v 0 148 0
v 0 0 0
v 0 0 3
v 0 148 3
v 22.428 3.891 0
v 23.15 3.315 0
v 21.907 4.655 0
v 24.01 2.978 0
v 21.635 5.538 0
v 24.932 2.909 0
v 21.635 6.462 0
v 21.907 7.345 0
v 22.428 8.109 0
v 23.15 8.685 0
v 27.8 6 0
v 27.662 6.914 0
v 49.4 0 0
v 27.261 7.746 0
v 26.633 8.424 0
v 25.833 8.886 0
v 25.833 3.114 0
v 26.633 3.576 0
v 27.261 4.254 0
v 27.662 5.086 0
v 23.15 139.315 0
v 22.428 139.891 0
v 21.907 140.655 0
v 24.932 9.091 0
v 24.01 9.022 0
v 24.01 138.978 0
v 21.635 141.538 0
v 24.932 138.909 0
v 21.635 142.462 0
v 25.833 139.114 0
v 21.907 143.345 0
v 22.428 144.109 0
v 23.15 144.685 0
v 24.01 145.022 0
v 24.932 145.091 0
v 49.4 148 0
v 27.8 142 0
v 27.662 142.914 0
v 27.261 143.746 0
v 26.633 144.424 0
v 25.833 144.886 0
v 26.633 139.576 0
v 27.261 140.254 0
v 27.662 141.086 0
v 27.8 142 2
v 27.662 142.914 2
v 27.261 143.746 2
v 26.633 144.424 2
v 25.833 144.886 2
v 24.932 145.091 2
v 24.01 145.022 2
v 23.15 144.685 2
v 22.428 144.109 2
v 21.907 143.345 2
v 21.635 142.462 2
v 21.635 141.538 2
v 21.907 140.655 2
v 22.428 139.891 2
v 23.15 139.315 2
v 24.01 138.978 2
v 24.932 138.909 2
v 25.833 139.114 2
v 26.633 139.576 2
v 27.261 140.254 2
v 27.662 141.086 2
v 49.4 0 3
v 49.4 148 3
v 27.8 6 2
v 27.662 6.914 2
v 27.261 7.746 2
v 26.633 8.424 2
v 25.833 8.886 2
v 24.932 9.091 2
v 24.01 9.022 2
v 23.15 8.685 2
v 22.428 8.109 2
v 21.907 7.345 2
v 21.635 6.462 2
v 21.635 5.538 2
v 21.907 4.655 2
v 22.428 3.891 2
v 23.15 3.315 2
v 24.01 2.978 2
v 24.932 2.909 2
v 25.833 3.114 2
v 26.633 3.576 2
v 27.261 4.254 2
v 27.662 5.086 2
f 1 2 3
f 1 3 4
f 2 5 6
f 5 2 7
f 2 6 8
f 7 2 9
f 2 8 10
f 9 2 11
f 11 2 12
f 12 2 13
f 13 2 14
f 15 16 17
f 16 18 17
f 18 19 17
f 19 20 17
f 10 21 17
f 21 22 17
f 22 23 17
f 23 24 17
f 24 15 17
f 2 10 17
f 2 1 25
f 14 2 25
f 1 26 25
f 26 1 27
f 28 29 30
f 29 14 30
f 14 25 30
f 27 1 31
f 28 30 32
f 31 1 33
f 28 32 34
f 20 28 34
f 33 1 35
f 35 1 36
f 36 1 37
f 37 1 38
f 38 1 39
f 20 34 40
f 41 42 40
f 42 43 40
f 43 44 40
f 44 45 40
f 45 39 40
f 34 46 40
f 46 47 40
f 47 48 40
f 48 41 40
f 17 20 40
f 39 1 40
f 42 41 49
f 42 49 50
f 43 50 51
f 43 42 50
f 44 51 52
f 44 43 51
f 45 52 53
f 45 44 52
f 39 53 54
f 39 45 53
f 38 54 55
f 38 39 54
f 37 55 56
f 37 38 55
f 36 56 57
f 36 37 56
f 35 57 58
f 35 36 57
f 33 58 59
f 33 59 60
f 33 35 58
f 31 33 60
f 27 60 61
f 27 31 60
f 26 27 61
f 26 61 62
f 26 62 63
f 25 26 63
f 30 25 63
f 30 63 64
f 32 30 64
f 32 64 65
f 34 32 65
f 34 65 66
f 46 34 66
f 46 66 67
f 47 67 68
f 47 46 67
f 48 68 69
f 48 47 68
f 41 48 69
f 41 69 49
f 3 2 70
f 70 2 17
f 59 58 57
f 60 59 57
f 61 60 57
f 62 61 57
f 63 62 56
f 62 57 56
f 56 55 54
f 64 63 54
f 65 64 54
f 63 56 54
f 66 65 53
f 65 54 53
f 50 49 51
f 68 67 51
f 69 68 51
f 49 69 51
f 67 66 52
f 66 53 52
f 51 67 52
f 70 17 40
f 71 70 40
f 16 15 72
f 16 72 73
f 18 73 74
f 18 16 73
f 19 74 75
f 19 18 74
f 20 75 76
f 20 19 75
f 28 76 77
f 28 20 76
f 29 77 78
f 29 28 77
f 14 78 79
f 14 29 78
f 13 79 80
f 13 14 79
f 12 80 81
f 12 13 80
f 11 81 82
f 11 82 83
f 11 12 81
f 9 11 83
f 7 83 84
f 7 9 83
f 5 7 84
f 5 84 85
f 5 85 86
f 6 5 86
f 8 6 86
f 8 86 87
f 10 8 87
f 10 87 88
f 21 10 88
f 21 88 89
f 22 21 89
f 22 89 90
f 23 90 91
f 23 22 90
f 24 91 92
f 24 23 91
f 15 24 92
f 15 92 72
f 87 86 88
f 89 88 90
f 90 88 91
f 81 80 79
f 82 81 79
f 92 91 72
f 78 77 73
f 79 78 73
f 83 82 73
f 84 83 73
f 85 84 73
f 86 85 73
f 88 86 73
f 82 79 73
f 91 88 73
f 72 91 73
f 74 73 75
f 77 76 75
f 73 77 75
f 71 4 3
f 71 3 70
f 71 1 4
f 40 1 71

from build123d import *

# Parameters (mm, degrees)
SKETCH_W     = 49.4
SKETCH_H     = 148
PAD_DEPTH    = 3
SKETCH001_R  = 3.1
POCKET_DEPTH = 2


with BuildPart() as part:
    # Sketch → Pad (new body)
    with BuildSketch(Plane.XY):
        with Locations((24.7, 74)):
            Rectangle(SKETCH_W, SKETCH_H)
    extrude(amount=PAD_DEPTH)

    # Sketch001 → Pocket (cut)
    with BuildSketch(Plane.XY):
        with Locations((24.7, 6)):
            Circle(SKETCH001_R)
        with Locations((24.7, 142)):
            Circle(SKETCH001_R)
    extrude(amount=POCKET_DEPTH, mode=Mode.SUBTRACT)


solid = part.part
